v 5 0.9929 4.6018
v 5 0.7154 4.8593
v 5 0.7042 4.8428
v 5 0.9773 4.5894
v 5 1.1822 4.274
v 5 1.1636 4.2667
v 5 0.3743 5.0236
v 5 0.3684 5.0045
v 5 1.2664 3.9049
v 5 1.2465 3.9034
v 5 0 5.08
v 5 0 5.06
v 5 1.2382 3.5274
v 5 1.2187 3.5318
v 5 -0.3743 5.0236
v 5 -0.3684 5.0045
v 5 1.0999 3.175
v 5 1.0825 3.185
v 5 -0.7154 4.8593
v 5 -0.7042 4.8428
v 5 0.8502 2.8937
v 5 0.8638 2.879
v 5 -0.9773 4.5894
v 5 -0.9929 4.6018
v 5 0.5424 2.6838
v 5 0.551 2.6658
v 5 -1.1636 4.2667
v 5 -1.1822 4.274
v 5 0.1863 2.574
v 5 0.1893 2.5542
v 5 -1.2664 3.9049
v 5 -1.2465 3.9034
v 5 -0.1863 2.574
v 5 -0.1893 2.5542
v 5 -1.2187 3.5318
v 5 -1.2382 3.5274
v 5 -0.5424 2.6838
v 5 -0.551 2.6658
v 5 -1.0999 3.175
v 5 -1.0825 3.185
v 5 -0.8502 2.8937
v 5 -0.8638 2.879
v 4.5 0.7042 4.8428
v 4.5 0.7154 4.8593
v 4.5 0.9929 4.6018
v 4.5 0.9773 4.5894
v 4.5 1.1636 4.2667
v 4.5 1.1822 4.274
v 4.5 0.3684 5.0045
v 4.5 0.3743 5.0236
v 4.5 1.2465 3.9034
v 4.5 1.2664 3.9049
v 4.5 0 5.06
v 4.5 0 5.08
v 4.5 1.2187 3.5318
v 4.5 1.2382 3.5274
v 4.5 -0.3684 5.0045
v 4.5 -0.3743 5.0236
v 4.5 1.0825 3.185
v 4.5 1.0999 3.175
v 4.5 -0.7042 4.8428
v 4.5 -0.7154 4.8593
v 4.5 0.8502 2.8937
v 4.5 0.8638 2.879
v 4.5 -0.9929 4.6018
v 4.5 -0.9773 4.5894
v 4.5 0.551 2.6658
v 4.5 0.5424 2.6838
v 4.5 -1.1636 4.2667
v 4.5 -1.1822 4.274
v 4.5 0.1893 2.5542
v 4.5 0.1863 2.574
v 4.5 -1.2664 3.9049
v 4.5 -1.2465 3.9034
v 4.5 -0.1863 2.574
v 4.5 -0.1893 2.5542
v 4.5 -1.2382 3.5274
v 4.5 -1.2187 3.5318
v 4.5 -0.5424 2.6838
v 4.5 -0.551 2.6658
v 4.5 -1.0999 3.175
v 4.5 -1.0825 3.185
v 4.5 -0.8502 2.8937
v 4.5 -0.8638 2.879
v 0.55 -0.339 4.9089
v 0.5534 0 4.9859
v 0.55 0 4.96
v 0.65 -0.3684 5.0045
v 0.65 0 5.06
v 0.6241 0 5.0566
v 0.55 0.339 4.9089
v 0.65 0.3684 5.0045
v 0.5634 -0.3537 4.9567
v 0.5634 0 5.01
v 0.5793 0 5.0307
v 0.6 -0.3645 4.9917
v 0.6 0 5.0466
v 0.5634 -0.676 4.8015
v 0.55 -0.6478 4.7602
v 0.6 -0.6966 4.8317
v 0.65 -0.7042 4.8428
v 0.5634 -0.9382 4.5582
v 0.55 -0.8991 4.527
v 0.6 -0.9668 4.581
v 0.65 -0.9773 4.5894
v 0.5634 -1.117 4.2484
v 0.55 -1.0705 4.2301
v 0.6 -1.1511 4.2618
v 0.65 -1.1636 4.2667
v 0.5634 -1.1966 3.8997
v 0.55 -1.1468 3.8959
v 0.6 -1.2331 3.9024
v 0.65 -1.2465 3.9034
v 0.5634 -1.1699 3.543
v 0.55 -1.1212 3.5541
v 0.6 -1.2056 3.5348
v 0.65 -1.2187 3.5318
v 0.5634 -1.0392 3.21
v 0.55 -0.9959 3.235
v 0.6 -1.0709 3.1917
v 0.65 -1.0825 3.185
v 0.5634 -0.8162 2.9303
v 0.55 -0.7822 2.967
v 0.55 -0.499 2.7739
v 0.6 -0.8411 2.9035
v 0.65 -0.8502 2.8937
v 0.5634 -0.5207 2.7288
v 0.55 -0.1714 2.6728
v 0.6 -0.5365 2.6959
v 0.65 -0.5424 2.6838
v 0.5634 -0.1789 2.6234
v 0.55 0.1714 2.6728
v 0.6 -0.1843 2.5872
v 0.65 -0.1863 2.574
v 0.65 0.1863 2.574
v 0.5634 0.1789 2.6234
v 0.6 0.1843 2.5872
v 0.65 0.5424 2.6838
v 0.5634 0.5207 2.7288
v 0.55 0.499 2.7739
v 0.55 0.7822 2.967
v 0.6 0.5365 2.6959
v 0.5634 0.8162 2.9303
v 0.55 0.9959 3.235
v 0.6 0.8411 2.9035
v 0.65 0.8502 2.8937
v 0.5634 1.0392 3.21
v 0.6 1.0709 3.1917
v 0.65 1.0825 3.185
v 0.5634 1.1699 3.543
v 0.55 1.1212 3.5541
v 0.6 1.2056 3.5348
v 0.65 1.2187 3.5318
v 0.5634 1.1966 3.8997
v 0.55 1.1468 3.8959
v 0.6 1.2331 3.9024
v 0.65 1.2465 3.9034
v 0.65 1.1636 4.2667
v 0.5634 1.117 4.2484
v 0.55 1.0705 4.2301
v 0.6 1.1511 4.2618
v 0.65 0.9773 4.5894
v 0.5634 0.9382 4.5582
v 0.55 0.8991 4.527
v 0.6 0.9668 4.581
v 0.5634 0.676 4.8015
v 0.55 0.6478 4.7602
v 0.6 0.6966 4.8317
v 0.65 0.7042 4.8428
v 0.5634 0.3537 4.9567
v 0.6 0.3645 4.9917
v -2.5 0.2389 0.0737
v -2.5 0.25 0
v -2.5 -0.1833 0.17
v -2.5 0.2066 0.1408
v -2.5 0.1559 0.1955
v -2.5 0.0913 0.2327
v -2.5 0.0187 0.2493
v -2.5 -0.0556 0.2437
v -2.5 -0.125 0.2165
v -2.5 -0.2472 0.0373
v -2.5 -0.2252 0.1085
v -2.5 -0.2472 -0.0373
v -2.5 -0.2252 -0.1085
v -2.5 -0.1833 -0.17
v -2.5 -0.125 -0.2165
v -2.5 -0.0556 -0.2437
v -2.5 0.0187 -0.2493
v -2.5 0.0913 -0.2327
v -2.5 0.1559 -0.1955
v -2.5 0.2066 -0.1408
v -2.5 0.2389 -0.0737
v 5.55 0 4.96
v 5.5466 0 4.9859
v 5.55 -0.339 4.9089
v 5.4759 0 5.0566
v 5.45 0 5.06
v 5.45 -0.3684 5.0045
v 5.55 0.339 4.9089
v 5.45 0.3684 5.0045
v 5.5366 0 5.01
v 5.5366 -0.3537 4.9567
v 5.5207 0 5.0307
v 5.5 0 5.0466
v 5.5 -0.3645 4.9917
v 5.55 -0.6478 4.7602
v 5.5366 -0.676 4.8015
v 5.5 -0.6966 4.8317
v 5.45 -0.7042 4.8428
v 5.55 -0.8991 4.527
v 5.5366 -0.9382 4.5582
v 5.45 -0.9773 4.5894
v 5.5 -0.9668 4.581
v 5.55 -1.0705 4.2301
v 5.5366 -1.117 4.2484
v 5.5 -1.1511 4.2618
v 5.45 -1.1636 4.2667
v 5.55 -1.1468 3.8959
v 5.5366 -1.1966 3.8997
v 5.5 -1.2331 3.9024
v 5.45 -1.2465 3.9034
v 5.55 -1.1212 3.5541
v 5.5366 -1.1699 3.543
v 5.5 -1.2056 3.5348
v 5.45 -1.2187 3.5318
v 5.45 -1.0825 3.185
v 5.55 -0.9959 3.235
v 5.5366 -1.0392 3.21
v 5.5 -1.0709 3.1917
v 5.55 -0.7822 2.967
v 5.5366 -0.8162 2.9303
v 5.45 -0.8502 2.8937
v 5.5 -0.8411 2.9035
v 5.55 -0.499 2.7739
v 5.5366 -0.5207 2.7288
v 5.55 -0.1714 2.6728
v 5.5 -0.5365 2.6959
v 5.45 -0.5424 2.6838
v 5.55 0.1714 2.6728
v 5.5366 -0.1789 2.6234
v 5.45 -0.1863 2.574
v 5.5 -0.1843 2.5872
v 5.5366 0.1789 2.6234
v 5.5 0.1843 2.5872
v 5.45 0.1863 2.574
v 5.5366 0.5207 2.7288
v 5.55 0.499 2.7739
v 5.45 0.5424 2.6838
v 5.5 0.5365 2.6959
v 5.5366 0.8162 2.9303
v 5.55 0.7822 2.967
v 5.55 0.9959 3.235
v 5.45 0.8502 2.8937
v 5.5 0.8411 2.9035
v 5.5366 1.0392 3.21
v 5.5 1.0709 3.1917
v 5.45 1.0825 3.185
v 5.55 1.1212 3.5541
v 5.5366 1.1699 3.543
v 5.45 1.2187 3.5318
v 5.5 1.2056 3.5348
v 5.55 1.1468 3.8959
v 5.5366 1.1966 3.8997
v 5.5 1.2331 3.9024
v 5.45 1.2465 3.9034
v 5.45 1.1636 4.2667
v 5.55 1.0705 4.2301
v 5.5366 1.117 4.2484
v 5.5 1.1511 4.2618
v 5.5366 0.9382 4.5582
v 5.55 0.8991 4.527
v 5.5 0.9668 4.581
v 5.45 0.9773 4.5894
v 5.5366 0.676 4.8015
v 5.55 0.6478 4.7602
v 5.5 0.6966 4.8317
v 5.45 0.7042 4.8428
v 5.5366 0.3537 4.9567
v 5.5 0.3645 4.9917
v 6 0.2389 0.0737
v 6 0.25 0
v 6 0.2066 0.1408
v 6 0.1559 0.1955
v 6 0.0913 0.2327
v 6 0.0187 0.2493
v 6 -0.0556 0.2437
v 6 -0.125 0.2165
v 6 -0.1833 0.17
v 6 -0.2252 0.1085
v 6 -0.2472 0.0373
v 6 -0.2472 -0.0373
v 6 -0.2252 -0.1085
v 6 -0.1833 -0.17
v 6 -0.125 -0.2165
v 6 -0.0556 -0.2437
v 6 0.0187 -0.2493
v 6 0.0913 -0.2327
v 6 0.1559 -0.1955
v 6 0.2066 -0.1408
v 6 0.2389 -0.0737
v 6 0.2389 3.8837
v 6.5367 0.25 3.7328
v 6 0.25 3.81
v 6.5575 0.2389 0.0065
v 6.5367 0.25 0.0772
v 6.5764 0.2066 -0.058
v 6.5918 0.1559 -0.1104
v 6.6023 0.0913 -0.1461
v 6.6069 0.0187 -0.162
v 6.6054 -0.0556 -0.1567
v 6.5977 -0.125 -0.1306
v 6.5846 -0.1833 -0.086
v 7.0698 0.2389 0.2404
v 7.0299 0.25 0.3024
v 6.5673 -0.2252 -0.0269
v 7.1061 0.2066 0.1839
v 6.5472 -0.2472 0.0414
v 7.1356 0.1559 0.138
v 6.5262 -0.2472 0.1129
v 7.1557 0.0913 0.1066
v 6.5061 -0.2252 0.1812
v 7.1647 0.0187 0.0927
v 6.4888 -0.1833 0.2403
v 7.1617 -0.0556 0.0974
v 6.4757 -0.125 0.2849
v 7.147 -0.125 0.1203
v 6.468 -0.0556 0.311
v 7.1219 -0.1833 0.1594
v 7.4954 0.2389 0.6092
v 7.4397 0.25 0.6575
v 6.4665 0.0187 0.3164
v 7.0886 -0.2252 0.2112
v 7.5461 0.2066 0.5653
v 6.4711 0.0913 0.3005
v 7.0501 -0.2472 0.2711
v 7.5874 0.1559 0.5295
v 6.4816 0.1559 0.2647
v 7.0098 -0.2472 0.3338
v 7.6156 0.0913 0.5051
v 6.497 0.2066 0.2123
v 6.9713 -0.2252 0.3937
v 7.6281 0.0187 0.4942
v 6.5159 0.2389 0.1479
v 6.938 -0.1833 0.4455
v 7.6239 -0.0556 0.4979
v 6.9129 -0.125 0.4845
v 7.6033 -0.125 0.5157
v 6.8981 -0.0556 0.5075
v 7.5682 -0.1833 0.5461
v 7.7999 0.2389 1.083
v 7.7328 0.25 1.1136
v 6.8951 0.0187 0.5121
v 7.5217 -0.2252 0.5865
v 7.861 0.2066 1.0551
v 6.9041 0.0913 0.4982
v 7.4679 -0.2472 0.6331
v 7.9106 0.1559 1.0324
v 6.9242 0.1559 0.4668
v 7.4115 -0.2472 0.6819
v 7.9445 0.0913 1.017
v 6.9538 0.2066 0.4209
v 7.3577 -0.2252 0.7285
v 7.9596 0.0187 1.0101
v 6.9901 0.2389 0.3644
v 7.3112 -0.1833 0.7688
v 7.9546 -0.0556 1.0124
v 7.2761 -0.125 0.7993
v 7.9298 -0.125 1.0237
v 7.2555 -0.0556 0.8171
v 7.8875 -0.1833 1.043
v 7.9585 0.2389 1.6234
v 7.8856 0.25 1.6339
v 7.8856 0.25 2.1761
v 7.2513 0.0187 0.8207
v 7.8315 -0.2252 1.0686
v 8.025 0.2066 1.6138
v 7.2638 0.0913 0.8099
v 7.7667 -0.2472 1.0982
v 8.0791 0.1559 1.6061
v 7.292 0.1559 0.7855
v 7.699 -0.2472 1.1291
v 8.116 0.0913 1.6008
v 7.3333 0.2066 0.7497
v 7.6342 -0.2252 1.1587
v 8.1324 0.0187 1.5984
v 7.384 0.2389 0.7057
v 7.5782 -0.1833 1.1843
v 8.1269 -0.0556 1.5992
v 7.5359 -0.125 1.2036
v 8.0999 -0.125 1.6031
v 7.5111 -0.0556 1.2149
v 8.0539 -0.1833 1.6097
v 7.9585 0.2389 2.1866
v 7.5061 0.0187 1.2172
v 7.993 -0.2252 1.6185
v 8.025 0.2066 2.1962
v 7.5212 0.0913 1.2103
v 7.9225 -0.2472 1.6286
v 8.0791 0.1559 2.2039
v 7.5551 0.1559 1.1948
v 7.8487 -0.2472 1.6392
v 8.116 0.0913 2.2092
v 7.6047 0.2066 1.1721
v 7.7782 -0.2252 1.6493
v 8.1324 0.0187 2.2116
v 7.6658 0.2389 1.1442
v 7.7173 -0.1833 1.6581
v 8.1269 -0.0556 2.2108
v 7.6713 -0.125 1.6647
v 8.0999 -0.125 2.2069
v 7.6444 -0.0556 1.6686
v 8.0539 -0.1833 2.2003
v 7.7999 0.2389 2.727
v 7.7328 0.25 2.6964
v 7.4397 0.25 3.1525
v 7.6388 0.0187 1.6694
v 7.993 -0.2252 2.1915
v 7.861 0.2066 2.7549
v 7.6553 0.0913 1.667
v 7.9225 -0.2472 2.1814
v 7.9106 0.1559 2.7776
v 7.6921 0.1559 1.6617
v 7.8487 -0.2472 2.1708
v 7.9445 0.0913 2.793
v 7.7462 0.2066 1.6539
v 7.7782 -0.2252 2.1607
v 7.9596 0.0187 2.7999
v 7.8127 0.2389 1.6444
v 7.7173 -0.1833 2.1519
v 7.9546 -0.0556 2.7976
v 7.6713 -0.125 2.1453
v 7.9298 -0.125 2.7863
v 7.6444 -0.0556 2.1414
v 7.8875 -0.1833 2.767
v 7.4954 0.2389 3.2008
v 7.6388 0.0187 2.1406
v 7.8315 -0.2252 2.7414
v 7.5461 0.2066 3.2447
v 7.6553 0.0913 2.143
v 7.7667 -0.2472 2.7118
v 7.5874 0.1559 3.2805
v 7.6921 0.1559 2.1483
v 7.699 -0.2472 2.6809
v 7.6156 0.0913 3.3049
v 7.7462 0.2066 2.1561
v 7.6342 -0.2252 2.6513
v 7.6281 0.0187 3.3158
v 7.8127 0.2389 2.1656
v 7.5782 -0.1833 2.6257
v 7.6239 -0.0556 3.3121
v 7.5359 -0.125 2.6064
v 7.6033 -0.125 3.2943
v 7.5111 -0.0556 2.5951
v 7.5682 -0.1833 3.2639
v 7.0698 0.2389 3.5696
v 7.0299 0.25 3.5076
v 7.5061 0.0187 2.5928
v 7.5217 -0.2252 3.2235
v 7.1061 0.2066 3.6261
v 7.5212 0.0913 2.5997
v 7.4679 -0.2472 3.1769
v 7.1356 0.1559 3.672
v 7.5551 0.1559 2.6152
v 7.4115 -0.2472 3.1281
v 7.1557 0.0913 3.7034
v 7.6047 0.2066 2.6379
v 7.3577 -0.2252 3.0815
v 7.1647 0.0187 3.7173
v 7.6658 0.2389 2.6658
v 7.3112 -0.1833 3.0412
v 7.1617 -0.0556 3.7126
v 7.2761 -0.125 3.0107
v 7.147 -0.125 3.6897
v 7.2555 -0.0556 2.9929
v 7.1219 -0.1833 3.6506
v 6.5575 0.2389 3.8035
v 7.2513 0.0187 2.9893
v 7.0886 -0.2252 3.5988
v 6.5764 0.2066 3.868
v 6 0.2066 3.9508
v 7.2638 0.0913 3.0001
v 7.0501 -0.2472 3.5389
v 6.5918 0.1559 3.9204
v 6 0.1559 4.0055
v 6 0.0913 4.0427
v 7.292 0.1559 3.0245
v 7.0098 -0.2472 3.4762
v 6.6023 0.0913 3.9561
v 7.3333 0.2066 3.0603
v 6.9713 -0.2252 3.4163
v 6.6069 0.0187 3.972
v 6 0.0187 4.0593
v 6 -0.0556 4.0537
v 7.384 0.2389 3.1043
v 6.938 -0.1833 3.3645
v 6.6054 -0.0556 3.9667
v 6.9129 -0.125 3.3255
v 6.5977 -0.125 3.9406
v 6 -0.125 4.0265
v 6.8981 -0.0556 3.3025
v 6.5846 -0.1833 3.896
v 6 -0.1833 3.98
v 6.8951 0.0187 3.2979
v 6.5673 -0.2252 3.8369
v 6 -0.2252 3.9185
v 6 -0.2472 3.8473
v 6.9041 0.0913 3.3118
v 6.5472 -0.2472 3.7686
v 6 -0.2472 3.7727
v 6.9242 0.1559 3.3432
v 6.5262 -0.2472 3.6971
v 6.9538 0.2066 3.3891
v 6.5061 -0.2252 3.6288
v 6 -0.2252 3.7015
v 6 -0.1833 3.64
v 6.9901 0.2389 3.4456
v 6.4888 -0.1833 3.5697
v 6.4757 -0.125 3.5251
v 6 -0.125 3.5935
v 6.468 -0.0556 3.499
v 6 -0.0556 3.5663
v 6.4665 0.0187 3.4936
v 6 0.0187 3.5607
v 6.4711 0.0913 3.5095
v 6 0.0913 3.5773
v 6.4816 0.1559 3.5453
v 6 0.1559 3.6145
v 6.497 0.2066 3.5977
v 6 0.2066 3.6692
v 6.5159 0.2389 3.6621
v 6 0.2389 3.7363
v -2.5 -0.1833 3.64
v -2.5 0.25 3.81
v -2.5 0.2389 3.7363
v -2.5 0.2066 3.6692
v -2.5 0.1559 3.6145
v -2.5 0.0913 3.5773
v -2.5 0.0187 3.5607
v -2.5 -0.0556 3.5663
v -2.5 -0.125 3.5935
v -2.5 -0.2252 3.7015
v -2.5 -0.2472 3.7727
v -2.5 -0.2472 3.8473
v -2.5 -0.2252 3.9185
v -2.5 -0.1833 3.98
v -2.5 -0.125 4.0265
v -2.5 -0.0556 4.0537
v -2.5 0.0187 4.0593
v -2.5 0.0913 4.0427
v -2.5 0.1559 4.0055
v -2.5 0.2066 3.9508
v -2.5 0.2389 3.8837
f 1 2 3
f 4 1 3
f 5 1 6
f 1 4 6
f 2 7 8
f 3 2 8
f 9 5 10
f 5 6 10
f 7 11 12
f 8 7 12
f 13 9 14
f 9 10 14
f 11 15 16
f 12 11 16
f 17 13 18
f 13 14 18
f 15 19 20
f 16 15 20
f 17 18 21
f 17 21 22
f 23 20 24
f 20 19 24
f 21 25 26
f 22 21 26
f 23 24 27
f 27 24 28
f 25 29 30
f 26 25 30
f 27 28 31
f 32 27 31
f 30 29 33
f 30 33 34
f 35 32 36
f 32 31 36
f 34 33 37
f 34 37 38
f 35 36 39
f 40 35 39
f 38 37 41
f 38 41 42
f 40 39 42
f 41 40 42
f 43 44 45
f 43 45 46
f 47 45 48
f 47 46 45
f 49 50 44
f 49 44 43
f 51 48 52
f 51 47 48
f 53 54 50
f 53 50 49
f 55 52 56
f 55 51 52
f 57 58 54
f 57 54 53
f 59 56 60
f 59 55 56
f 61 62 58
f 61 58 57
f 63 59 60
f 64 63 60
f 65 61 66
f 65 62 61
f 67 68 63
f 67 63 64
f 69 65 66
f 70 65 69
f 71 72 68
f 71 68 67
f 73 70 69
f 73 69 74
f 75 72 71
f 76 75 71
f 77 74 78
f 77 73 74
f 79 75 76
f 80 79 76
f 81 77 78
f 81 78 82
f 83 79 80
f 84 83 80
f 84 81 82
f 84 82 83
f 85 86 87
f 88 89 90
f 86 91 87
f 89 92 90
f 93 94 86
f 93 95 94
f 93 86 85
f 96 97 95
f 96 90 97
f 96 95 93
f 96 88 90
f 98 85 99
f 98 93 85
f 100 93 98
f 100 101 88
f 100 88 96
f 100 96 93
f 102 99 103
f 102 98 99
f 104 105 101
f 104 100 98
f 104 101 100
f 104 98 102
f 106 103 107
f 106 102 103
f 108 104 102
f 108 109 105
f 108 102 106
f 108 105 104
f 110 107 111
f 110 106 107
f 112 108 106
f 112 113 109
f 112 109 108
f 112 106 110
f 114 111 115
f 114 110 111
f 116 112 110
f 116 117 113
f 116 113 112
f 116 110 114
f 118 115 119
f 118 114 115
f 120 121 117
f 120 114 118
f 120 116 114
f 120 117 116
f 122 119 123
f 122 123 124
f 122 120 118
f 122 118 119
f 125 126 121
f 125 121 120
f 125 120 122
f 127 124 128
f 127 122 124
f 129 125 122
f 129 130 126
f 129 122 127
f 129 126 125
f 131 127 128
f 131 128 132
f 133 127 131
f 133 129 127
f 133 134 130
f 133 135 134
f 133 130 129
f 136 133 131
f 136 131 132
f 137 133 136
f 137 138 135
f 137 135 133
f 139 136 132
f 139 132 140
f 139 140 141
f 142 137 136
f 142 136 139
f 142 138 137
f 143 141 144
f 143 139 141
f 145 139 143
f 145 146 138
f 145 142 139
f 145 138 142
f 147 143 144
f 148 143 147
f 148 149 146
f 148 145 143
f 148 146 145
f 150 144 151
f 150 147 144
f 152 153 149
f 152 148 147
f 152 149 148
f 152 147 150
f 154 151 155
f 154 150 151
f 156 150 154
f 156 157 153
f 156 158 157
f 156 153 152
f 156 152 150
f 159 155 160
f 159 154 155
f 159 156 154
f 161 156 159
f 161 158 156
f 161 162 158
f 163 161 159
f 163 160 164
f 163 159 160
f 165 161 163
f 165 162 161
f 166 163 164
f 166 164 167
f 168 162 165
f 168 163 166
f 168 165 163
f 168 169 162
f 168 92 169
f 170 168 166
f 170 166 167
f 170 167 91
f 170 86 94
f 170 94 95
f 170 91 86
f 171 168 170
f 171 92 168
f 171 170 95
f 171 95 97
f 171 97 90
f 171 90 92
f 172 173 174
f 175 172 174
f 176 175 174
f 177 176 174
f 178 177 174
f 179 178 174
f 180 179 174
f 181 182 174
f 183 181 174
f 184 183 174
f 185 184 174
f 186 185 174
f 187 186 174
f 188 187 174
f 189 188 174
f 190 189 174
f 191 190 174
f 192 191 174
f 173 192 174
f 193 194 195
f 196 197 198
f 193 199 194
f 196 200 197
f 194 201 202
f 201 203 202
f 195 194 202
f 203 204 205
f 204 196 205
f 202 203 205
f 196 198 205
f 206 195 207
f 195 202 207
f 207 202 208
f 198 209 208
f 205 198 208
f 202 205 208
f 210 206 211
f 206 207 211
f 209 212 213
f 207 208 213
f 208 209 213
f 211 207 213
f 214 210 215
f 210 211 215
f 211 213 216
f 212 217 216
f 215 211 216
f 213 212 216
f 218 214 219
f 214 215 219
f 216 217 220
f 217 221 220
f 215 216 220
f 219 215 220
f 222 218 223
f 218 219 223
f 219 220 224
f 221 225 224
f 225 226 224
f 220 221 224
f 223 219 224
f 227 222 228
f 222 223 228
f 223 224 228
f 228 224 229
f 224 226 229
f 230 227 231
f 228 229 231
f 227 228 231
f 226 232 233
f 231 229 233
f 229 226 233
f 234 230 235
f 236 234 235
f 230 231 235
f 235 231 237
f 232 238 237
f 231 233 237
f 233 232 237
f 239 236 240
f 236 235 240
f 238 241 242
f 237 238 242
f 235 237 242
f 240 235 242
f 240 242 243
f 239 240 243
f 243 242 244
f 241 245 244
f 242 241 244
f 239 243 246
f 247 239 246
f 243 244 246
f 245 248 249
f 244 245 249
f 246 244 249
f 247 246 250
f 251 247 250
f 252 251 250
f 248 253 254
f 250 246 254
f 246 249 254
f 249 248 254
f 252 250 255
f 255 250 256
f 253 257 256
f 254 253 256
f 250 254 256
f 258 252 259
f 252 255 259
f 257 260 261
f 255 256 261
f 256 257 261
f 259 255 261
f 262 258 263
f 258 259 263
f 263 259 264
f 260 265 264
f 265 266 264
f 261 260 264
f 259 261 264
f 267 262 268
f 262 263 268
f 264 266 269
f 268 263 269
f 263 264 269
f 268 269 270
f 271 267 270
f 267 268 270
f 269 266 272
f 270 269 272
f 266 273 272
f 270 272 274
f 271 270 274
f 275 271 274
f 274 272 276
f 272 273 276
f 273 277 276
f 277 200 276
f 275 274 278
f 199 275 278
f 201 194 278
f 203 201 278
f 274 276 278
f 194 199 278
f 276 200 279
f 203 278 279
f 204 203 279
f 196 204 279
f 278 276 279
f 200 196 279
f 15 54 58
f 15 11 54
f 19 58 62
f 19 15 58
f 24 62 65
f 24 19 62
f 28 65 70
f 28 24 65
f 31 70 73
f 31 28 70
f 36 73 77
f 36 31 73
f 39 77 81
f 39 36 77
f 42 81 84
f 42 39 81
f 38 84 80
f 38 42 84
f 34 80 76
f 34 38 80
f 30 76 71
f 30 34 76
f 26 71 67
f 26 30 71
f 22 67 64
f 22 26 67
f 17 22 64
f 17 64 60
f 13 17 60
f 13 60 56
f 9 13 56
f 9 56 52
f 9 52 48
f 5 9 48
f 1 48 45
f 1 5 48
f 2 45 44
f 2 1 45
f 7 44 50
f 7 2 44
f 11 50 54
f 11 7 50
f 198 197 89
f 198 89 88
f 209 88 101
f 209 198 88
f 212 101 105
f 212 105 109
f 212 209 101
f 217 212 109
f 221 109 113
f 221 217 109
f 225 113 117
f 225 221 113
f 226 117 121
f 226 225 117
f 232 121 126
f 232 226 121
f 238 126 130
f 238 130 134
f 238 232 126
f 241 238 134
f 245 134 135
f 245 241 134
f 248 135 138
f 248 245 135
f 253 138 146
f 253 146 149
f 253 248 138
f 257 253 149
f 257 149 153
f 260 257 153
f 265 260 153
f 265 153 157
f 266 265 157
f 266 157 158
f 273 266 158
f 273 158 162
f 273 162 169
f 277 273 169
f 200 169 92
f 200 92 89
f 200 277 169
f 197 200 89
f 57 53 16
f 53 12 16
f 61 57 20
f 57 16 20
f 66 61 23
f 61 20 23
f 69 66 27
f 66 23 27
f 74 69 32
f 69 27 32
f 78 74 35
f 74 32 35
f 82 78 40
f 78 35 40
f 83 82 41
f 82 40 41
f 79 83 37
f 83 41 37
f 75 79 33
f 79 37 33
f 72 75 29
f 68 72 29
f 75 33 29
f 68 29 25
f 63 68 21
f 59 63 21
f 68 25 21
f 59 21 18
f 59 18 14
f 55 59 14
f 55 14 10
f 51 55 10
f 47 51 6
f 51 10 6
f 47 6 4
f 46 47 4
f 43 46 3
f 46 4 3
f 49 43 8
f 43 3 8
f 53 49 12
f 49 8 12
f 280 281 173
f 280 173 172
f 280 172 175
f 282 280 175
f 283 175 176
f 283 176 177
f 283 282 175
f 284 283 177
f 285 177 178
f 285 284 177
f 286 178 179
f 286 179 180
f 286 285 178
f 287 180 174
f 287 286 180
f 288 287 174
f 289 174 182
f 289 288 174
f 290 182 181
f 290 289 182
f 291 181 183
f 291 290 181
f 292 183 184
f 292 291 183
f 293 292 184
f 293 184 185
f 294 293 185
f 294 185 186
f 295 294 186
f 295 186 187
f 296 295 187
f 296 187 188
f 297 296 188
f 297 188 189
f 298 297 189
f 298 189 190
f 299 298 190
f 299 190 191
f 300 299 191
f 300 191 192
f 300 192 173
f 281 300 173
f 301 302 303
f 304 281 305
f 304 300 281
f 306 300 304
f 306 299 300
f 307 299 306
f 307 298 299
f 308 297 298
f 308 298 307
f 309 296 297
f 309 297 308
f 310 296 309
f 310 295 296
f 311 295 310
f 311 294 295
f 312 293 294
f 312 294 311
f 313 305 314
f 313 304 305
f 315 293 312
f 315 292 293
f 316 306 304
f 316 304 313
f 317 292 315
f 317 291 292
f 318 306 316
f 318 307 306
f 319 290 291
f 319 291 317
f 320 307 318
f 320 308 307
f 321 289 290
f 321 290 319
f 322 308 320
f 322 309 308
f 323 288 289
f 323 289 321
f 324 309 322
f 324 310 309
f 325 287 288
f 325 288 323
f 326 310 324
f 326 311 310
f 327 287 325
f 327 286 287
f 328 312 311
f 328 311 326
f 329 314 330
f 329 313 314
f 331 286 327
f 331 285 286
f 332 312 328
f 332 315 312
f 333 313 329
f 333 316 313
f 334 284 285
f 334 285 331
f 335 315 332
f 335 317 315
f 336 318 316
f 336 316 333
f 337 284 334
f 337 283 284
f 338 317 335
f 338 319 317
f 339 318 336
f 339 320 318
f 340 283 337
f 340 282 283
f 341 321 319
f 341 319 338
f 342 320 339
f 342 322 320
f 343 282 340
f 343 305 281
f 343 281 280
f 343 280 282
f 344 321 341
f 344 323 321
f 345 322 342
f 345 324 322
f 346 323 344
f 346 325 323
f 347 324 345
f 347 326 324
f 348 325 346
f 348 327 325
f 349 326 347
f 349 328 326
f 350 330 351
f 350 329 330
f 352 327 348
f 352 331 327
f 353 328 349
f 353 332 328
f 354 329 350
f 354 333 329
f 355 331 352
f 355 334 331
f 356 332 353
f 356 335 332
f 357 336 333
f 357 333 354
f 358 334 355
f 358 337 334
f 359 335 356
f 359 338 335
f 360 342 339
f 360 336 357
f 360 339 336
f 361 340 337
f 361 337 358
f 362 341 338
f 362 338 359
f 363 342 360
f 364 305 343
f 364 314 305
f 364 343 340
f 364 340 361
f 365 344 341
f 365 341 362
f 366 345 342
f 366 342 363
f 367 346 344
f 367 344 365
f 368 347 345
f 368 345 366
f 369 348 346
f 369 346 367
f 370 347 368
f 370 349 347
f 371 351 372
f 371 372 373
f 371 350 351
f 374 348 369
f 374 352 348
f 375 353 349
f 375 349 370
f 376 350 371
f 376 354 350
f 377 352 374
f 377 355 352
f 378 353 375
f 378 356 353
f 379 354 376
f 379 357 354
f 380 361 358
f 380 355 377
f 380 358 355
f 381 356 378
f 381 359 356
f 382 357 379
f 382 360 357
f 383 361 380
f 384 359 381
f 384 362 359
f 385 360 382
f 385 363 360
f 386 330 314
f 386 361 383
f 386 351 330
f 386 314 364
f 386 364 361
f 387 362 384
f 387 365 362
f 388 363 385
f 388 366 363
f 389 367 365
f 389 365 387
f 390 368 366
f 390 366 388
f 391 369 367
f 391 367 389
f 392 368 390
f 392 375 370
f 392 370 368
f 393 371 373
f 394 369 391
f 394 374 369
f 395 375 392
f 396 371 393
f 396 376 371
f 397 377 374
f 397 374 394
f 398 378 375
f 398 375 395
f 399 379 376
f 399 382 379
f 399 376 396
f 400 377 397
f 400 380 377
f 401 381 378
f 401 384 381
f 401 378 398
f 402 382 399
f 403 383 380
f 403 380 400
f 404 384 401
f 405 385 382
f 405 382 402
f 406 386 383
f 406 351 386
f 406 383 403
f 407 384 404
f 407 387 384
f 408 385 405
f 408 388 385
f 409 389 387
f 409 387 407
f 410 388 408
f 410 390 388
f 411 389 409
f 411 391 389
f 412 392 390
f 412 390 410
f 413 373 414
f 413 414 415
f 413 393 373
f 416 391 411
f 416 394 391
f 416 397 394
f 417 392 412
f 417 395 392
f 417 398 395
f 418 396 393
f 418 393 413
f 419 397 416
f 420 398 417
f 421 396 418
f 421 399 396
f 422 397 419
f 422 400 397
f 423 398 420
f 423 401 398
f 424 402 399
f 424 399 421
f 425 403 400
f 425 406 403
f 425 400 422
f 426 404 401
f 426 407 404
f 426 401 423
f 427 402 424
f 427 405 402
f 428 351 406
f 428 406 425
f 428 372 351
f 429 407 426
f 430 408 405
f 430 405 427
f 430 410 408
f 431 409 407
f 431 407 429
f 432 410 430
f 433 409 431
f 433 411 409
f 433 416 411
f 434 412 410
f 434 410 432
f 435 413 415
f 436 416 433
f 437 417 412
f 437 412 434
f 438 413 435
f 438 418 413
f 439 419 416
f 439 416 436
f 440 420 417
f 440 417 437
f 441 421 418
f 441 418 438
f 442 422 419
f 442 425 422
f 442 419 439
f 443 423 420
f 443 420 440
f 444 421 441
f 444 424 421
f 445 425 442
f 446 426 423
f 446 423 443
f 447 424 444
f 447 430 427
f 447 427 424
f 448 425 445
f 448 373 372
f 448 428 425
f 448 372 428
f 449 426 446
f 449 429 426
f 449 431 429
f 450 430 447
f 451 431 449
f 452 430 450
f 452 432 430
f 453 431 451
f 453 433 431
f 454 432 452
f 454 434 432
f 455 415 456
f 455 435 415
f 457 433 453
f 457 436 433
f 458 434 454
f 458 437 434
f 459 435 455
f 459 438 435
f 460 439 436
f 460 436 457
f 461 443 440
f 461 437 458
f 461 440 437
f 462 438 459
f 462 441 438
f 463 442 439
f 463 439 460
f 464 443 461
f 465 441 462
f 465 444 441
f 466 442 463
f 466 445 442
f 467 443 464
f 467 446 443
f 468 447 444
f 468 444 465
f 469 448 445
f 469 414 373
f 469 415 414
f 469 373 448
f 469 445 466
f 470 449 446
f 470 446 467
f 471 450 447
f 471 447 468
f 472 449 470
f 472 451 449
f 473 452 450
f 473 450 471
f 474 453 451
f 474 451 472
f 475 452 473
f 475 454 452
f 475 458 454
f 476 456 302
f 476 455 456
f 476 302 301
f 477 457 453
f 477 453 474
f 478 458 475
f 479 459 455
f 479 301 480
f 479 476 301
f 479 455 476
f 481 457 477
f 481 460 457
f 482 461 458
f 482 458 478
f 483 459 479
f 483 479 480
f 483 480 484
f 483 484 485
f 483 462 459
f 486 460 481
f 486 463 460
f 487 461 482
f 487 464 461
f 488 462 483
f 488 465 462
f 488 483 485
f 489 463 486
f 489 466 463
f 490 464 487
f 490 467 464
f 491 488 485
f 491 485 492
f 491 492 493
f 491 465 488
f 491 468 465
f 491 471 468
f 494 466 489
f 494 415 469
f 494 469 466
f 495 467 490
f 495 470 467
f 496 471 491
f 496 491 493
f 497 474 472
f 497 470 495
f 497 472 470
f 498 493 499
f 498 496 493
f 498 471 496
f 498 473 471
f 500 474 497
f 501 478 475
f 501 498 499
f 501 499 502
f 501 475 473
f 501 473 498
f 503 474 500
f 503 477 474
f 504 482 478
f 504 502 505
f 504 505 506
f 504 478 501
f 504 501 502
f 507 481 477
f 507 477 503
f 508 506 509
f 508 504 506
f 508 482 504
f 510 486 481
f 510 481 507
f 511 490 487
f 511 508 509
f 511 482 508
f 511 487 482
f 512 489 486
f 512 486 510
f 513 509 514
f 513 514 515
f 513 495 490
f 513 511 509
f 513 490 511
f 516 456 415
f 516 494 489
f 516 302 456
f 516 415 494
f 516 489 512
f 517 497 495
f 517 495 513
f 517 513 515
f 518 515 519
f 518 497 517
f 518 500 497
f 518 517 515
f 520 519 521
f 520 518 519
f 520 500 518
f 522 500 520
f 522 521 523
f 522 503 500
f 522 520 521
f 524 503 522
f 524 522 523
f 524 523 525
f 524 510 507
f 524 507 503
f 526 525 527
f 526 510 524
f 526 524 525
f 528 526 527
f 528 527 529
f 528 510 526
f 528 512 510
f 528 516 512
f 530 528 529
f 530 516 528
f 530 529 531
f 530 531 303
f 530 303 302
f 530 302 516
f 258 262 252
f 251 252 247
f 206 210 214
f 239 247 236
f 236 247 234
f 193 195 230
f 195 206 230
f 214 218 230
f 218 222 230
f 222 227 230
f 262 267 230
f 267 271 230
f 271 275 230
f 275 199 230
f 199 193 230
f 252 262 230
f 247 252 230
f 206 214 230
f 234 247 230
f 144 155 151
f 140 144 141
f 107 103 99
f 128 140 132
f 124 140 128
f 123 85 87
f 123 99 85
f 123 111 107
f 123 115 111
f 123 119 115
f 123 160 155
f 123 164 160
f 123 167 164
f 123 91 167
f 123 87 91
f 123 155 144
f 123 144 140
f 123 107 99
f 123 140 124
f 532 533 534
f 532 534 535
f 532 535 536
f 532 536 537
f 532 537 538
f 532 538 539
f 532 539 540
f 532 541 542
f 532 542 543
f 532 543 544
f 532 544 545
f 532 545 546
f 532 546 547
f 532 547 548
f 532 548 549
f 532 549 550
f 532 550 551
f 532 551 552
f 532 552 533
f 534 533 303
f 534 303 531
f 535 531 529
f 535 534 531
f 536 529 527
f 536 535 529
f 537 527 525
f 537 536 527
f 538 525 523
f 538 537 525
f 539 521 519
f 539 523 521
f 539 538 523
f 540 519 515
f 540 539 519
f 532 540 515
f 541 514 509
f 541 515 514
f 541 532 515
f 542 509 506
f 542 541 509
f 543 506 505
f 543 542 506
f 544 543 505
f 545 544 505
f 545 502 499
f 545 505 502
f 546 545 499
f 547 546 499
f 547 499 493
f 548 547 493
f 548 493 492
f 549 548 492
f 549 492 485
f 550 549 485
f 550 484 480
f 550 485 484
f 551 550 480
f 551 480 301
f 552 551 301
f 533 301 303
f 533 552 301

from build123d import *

# Parameters (mm, degrees)
SKETCH_R    = 0.25
SKETCH002_W = 5
SKETCH002_H = 1.25
FILLET_R    = 0.1
SKETCH003_W = 0.5
SKETCH003_H = 0.02


with BuildPart() as sweep_body:
    # Sweep: sweep along a path in Sketch001
    with BuildLine(Plane.XZ) as sweep_path:
        Line((-2.5, 0), (6, 0))
        ThreePointArc((6, 0), (7.905, 1.905), (6, 3.81))
        Line((6, 3.81), (-2.5, 3.81))
    # Sketch → Sweep (sweep)
    with BuildSketch(Plane.YZ.offset(-2.5)):
        Circle(SKETCH_R)
    sweep(path=sweep_path.line, is_frenet=True)


with BuildPart() as fillet_body:
    # Sketch002 → Revolution (revolve)
    with BuildSketch(Plane.XZ):
        with Locations((3.05, 4.435)):
            Rectangle(SKETCH002_W, SKETCH002_H)
    revolve(axis=Axis((0.55, 0, 3.81), (1, 0, 0)))

    # Fillet
    fillet_edges = [fillet_body.edges().sort_by_distance(p)[0] for p in [
        (0.55, 0, 2.56),
        (5.55, 0, 2.56),
    ]]
    fillet(fillet_edges, radius=FILLET_R)


with BuildPart() as revolution001:
    # Sketch003 → Revolution001 (revolve)
    with BuildSketch(Plane.XZ):
        with Locations((4.75, 5.07)):
            Rectangle(SKETCH003_W, SKETCH003_H)
    revolve(axis=Axis((0, 0, 3.81), (1, 0, 0)))


solid = Compound([sweep_body.part, fillet_body.part, revolution001.part])
